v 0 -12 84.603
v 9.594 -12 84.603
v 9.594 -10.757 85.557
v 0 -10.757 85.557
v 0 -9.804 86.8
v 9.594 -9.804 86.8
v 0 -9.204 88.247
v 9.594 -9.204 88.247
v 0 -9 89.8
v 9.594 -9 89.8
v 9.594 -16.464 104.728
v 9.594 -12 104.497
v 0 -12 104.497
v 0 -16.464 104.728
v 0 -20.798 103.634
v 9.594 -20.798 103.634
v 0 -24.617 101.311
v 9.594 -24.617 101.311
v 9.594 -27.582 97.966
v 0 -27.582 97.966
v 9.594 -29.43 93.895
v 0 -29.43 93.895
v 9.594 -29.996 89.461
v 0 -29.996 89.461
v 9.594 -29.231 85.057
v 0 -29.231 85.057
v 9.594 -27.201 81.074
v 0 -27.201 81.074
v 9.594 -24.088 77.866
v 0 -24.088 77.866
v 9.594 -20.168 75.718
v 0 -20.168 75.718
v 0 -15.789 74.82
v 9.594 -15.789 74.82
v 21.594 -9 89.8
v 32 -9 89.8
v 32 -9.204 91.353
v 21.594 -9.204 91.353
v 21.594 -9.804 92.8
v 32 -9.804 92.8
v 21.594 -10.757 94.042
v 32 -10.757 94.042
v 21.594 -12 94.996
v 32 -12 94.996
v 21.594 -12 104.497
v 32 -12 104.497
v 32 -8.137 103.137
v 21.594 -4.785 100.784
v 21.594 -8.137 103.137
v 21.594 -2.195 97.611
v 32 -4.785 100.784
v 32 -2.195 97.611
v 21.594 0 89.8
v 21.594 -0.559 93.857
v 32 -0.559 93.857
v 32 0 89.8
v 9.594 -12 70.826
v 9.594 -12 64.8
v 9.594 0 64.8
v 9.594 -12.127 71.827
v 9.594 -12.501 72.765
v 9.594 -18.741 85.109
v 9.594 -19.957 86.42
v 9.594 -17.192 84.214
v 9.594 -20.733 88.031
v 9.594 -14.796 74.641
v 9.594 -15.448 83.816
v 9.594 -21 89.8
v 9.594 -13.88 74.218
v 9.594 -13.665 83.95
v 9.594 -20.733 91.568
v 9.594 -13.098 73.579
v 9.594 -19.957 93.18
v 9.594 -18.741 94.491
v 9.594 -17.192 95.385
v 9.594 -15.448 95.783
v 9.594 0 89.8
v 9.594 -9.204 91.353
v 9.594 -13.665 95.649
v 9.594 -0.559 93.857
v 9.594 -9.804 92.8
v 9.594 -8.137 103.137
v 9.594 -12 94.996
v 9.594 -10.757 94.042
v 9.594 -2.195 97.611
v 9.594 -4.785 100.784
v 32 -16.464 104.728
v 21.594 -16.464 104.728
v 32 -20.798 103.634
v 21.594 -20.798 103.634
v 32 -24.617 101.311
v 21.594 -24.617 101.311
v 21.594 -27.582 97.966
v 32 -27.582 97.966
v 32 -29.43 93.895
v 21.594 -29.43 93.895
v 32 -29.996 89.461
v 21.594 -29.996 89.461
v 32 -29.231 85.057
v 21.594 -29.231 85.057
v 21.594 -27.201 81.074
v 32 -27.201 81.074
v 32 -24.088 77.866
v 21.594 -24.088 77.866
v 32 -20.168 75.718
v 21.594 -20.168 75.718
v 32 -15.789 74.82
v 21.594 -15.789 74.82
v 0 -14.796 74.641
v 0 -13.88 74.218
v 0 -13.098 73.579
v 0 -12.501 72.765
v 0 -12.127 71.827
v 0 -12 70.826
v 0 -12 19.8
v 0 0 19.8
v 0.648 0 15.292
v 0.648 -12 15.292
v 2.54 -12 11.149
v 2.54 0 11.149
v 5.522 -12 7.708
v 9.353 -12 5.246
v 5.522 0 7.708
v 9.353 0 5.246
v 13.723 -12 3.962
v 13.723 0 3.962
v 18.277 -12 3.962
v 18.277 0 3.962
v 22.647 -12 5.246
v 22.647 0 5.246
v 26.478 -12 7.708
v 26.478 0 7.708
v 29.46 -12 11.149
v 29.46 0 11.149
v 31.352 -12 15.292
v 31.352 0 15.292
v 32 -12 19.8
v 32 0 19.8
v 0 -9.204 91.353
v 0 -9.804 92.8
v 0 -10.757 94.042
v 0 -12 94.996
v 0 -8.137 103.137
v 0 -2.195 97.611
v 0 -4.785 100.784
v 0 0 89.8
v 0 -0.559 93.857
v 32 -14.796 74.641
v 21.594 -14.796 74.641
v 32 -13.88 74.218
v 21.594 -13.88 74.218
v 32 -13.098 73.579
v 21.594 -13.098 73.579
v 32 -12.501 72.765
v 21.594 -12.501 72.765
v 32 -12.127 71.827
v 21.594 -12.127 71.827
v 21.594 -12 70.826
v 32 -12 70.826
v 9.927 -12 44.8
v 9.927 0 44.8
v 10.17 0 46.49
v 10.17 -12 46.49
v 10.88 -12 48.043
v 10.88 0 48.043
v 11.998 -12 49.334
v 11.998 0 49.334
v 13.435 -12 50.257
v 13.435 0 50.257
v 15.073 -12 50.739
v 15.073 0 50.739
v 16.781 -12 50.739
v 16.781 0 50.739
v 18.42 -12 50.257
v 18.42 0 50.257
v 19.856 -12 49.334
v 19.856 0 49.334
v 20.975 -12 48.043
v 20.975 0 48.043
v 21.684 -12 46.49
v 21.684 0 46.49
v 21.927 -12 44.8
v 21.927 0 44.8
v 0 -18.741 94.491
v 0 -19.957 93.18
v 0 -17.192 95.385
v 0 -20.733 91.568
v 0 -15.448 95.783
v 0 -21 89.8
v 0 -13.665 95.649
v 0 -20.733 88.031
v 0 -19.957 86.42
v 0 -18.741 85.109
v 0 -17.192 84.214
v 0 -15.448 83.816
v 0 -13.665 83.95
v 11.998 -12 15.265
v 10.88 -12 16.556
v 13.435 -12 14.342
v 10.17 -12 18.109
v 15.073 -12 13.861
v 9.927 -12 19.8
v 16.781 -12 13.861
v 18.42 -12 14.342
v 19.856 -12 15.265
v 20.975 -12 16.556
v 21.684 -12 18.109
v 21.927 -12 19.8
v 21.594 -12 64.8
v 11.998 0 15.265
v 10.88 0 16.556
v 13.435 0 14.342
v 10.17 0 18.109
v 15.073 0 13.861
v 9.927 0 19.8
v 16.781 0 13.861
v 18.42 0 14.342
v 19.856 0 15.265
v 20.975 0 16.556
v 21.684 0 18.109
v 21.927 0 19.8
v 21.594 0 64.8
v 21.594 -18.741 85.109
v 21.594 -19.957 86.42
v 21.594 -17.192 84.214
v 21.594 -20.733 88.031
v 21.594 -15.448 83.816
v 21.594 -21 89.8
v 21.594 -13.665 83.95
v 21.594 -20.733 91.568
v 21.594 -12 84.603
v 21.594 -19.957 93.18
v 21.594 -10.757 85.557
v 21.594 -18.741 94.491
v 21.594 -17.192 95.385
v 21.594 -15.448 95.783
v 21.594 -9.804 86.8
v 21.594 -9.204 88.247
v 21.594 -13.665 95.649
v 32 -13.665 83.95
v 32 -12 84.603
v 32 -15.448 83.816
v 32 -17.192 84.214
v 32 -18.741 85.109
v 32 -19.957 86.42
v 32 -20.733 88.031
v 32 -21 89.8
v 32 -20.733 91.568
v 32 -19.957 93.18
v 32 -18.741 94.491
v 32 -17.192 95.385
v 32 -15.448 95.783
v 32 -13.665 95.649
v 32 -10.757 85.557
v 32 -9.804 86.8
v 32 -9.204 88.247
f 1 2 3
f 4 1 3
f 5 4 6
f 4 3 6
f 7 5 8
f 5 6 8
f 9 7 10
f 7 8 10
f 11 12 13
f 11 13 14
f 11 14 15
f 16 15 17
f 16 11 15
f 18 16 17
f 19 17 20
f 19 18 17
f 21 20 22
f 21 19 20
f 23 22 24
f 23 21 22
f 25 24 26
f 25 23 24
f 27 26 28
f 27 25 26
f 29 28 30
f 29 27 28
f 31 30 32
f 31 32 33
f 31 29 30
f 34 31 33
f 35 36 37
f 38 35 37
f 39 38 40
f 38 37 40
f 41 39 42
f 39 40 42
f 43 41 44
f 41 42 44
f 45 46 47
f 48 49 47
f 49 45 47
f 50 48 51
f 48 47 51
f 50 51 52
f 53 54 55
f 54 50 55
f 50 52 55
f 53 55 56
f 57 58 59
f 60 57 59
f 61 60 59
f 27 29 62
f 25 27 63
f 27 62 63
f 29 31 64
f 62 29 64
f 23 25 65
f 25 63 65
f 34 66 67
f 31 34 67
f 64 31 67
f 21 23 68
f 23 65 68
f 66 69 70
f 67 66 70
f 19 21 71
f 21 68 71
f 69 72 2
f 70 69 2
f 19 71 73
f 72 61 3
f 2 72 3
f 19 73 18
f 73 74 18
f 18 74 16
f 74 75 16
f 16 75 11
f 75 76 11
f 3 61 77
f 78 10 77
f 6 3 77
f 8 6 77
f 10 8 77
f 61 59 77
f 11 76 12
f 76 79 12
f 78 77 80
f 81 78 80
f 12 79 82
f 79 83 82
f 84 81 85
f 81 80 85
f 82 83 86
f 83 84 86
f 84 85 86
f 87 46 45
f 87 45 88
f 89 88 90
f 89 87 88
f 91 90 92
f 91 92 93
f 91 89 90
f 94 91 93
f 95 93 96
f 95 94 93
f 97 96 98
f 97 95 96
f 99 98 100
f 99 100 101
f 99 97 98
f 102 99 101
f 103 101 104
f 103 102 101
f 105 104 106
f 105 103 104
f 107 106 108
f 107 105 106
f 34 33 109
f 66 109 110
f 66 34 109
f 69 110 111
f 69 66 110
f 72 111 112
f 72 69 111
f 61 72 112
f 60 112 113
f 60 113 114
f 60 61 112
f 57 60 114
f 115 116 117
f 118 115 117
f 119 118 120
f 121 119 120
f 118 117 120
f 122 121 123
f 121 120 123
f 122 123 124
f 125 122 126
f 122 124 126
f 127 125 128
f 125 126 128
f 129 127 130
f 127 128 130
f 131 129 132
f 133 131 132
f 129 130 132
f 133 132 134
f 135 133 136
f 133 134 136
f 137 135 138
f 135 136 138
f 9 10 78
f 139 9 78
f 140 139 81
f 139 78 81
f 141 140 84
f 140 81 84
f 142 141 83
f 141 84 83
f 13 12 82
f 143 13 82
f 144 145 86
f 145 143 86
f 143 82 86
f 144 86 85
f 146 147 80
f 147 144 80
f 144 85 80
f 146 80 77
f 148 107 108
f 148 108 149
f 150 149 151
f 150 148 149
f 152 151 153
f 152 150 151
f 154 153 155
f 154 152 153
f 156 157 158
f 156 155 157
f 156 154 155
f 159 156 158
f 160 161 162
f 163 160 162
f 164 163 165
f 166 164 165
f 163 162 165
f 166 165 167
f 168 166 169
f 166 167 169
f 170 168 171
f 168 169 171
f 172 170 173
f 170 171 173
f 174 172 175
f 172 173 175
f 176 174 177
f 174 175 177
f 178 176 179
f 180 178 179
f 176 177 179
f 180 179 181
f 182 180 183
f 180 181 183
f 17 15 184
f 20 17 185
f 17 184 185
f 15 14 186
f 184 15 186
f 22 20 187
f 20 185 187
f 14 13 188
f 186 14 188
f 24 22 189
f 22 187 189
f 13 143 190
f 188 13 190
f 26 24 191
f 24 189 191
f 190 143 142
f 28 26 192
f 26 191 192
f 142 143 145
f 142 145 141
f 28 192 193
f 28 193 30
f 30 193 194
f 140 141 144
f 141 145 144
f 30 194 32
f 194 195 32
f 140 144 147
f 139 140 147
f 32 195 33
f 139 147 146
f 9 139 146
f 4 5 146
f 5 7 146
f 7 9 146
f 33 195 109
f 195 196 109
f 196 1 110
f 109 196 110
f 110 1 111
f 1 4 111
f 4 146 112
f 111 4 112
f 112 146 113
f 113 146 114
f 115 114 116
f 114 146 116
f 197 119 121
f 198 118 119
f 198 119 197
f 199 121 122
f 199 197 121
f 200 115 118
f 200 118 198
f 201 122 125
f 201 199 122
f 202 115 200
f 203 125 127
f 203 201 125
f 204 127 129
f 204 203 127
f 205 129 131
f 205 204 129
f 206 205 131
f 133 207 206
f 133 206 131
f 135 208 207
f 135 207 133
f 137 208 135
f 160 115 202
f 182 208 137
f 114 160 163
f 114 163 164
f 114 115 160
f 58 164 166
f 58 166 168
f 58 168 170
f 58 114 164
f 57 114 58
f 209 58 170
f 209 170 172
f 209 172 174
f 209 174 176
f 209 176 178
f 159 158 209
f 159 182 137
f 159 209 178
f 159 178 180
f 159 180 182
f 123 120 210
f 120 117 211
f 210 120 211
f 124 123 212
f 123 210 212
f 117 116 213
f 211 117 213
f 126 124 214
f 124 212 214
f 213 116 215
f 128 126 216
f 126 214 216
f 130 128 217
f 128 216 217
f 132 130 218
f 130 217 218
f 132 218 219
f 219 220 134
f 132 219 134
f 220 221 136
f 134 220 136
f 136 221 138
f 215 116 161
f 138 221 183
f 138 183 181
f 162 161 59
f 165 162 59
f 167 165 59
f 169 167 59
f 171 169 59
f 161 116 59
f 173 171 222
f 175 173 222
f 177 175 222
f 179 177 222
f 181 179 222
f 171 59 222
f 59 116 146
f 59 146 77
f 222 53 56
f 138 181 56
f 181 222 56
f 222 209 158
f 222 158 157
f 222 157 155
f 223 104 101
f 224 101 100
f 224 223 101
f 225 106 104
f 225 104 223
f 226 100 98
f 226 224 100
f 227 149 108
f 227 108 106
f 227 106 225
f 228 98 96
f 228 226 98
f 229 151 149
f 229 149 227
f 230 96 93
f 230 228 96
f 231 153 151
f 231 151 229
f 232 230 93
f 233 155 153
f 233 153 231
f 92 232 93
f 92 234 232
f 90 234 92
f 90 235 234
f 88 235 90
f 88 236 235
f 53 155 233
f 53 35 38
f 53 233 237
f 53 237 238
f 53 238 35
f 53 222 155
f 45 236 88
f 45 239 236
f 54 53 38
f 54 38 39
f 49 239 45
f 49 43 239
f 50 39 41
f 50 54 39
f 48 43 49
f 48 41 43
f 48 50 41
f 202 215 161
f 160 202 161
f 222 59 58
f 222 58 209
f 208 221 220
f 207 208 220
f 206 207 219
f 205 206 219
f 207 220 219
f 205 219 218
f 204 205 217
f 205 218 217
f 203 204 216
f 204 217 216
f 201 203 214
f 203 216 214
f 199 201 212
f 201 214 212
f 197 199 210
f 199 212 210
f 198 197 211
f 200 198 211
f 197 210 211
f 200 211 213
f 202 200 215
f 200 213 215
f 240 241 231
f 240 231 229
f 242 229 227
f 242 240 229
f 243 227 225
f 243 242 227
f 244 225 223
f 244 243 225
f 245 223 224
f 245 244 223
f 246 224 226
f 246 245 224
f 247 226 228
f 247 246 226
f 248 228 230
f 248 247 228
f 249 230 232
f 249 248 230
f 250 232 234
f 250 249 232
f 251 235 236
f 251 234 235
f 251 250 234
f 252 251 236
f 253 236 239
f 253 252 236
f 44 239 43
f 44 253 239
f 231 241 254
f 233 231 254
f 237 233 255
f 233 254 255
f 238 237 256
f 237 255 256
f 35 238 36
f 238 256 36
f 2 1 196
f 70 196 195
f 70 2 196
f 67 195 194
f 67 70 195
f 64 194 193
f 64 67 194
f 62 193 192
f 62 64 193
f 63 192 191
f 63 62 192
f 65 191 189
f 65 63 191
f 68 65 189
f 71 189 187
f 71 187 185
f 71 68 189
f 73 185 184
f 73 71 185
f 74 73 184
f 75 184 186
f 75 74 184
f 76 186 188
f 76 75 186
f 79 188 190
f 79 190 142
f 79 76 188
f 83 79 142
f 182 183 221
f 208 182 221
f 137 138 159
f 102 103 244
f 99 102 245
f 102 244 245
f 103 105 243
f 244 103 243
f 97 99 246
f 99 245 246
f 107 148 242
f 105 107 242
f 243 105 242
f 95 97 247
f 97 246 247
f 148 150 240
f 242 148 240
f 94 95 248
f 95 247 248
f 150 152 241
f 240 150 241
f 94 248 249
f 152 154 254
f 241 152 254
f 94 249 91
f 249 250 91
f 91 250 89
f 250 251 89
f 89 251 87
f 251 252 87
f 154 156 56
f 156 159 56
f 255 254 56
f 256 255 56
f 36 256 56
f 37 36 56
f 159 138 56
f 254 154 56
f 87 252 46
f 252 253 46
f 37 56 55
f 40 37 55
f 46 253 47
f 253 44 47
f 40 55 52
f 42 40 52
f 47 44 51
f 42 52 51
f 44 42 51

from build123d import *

# Parameters (mm, degrees)
F0_W     = 12
F0_H     = 40
F1_DEPTH = 12
F3_DEPTH = 32
F4_DEPTH = 32.001
F5_DEPTH = 32.001
F6_DEPTH = 30.001


with BuildPart() as f1:
    # F0 (on Front) → F1 (new body)
    with BuildSketch(Plane.XZ):
        with BuildLine():
            Line((0, 104.79962), (0, 19.79962))
            ThreePointArc((0, 19.79962), (16, 3.79962), (32, 19.79962))
            Line((32, 19.79962), (32, 104.79962))
            Line((32, 104.79962), (21.593631, 104.79962))
            Line((21.593631, 104.79962), (21.593631, 64.79962))
            Line((21.593631, 64.79962), (9.593631, 64.79962))
            Line((9.593631, 64.79962), (9.593631, 104.79962))
            Line((9.593631, 104.79962), (0, 104.79962))
        make_face()
        with BuildLine():
            Line((9.927311, 19.79962), (9.927311, 44.79962))
            ThreePointArc((9.927311, 44.79962), (15.927311, 50.79962), (21.927311, 44.79962))
            Line((21.927311, 44.79962), (21.927311, 19.79962))
            ThreePointArc((21.927311, 19.79962), (15.927311, 13.79962), (9.927311, 19.79962))
        make_face(mode=Mode.SUBTRACT)
        with Locations((15.593631, 84.79962)):
            Rectangle(F0_W, F0_H)
    extrude(amount=F1_DEPTH)

    # F2 (on face) → F3 (join)
    with BuildSketch(Plane.YZ.offset(32)):
        with BuildLine():
            Line((-12, 94.995772), (-12, 104.496558))
            ThreePointArc((-12, 104.496558), (-29.879182, 91.699606), (-15.789474, 74.82041))
            ThreePointArc((-15.789474, 74.82041), (-13.098095, 73.578943), (-12, 70.825954))
            Line((-12, 70.825954), (-12, 75.102681))
            Line((-12, 75.102681), (-12, 84.603468))
            ThreePointArc((-12, 84.603468), (-21, 89.79962), (-12, 94.995772))
        make_face()
    extrude(amount=-F3_DEPTH)

    # F2 (on face) → F4 (cut, through all)
    with BuildSketch(Plane.YZ.offset(32)):
        with BuildLine():
            ThreePointArc((-9, 89.79962), (-9.803848, 92.79962), (-12, 94.995772))
            Line((-12, 94.995772), (-12, 84.603468))
            ThreePointArc((-12, 84.603468), (-9.803848, 86.79962), (-9, 89.79962))
        make_face()
    extrude(amount=-F4_DEPTH, mode=Mode.SUBTRACT)

    # F2 (on face) → F5 (cut, through all)
    with BuildSketch(Plane.YZ.offset(32)):
        with BuildLine():
            ThreePointArc((-12, 104.496558), (-3.38105, 99.286453), (0, 89.79962))
            Line((0, 89.79962), (0, 104.79962))
            Line((0, 104.79962), (-12, 104.79962))
            Line((-12, 104.79962), (-12, 104.496558))
        make_face()
    extrude(amount=-F5_DEPTH, mode=Mode.SUBTRACT)

    # F0 (on Front) → F6 (cut, through all)
    with BuildSketch(Plane.XZ):
        with Locations((15.593631, 84.79962)):
            Rectangle(F0_W, F0_H)
    extrude(amount=F6_DEPTH, mode=Mode.SUBTRACT)


solid = f1.part
